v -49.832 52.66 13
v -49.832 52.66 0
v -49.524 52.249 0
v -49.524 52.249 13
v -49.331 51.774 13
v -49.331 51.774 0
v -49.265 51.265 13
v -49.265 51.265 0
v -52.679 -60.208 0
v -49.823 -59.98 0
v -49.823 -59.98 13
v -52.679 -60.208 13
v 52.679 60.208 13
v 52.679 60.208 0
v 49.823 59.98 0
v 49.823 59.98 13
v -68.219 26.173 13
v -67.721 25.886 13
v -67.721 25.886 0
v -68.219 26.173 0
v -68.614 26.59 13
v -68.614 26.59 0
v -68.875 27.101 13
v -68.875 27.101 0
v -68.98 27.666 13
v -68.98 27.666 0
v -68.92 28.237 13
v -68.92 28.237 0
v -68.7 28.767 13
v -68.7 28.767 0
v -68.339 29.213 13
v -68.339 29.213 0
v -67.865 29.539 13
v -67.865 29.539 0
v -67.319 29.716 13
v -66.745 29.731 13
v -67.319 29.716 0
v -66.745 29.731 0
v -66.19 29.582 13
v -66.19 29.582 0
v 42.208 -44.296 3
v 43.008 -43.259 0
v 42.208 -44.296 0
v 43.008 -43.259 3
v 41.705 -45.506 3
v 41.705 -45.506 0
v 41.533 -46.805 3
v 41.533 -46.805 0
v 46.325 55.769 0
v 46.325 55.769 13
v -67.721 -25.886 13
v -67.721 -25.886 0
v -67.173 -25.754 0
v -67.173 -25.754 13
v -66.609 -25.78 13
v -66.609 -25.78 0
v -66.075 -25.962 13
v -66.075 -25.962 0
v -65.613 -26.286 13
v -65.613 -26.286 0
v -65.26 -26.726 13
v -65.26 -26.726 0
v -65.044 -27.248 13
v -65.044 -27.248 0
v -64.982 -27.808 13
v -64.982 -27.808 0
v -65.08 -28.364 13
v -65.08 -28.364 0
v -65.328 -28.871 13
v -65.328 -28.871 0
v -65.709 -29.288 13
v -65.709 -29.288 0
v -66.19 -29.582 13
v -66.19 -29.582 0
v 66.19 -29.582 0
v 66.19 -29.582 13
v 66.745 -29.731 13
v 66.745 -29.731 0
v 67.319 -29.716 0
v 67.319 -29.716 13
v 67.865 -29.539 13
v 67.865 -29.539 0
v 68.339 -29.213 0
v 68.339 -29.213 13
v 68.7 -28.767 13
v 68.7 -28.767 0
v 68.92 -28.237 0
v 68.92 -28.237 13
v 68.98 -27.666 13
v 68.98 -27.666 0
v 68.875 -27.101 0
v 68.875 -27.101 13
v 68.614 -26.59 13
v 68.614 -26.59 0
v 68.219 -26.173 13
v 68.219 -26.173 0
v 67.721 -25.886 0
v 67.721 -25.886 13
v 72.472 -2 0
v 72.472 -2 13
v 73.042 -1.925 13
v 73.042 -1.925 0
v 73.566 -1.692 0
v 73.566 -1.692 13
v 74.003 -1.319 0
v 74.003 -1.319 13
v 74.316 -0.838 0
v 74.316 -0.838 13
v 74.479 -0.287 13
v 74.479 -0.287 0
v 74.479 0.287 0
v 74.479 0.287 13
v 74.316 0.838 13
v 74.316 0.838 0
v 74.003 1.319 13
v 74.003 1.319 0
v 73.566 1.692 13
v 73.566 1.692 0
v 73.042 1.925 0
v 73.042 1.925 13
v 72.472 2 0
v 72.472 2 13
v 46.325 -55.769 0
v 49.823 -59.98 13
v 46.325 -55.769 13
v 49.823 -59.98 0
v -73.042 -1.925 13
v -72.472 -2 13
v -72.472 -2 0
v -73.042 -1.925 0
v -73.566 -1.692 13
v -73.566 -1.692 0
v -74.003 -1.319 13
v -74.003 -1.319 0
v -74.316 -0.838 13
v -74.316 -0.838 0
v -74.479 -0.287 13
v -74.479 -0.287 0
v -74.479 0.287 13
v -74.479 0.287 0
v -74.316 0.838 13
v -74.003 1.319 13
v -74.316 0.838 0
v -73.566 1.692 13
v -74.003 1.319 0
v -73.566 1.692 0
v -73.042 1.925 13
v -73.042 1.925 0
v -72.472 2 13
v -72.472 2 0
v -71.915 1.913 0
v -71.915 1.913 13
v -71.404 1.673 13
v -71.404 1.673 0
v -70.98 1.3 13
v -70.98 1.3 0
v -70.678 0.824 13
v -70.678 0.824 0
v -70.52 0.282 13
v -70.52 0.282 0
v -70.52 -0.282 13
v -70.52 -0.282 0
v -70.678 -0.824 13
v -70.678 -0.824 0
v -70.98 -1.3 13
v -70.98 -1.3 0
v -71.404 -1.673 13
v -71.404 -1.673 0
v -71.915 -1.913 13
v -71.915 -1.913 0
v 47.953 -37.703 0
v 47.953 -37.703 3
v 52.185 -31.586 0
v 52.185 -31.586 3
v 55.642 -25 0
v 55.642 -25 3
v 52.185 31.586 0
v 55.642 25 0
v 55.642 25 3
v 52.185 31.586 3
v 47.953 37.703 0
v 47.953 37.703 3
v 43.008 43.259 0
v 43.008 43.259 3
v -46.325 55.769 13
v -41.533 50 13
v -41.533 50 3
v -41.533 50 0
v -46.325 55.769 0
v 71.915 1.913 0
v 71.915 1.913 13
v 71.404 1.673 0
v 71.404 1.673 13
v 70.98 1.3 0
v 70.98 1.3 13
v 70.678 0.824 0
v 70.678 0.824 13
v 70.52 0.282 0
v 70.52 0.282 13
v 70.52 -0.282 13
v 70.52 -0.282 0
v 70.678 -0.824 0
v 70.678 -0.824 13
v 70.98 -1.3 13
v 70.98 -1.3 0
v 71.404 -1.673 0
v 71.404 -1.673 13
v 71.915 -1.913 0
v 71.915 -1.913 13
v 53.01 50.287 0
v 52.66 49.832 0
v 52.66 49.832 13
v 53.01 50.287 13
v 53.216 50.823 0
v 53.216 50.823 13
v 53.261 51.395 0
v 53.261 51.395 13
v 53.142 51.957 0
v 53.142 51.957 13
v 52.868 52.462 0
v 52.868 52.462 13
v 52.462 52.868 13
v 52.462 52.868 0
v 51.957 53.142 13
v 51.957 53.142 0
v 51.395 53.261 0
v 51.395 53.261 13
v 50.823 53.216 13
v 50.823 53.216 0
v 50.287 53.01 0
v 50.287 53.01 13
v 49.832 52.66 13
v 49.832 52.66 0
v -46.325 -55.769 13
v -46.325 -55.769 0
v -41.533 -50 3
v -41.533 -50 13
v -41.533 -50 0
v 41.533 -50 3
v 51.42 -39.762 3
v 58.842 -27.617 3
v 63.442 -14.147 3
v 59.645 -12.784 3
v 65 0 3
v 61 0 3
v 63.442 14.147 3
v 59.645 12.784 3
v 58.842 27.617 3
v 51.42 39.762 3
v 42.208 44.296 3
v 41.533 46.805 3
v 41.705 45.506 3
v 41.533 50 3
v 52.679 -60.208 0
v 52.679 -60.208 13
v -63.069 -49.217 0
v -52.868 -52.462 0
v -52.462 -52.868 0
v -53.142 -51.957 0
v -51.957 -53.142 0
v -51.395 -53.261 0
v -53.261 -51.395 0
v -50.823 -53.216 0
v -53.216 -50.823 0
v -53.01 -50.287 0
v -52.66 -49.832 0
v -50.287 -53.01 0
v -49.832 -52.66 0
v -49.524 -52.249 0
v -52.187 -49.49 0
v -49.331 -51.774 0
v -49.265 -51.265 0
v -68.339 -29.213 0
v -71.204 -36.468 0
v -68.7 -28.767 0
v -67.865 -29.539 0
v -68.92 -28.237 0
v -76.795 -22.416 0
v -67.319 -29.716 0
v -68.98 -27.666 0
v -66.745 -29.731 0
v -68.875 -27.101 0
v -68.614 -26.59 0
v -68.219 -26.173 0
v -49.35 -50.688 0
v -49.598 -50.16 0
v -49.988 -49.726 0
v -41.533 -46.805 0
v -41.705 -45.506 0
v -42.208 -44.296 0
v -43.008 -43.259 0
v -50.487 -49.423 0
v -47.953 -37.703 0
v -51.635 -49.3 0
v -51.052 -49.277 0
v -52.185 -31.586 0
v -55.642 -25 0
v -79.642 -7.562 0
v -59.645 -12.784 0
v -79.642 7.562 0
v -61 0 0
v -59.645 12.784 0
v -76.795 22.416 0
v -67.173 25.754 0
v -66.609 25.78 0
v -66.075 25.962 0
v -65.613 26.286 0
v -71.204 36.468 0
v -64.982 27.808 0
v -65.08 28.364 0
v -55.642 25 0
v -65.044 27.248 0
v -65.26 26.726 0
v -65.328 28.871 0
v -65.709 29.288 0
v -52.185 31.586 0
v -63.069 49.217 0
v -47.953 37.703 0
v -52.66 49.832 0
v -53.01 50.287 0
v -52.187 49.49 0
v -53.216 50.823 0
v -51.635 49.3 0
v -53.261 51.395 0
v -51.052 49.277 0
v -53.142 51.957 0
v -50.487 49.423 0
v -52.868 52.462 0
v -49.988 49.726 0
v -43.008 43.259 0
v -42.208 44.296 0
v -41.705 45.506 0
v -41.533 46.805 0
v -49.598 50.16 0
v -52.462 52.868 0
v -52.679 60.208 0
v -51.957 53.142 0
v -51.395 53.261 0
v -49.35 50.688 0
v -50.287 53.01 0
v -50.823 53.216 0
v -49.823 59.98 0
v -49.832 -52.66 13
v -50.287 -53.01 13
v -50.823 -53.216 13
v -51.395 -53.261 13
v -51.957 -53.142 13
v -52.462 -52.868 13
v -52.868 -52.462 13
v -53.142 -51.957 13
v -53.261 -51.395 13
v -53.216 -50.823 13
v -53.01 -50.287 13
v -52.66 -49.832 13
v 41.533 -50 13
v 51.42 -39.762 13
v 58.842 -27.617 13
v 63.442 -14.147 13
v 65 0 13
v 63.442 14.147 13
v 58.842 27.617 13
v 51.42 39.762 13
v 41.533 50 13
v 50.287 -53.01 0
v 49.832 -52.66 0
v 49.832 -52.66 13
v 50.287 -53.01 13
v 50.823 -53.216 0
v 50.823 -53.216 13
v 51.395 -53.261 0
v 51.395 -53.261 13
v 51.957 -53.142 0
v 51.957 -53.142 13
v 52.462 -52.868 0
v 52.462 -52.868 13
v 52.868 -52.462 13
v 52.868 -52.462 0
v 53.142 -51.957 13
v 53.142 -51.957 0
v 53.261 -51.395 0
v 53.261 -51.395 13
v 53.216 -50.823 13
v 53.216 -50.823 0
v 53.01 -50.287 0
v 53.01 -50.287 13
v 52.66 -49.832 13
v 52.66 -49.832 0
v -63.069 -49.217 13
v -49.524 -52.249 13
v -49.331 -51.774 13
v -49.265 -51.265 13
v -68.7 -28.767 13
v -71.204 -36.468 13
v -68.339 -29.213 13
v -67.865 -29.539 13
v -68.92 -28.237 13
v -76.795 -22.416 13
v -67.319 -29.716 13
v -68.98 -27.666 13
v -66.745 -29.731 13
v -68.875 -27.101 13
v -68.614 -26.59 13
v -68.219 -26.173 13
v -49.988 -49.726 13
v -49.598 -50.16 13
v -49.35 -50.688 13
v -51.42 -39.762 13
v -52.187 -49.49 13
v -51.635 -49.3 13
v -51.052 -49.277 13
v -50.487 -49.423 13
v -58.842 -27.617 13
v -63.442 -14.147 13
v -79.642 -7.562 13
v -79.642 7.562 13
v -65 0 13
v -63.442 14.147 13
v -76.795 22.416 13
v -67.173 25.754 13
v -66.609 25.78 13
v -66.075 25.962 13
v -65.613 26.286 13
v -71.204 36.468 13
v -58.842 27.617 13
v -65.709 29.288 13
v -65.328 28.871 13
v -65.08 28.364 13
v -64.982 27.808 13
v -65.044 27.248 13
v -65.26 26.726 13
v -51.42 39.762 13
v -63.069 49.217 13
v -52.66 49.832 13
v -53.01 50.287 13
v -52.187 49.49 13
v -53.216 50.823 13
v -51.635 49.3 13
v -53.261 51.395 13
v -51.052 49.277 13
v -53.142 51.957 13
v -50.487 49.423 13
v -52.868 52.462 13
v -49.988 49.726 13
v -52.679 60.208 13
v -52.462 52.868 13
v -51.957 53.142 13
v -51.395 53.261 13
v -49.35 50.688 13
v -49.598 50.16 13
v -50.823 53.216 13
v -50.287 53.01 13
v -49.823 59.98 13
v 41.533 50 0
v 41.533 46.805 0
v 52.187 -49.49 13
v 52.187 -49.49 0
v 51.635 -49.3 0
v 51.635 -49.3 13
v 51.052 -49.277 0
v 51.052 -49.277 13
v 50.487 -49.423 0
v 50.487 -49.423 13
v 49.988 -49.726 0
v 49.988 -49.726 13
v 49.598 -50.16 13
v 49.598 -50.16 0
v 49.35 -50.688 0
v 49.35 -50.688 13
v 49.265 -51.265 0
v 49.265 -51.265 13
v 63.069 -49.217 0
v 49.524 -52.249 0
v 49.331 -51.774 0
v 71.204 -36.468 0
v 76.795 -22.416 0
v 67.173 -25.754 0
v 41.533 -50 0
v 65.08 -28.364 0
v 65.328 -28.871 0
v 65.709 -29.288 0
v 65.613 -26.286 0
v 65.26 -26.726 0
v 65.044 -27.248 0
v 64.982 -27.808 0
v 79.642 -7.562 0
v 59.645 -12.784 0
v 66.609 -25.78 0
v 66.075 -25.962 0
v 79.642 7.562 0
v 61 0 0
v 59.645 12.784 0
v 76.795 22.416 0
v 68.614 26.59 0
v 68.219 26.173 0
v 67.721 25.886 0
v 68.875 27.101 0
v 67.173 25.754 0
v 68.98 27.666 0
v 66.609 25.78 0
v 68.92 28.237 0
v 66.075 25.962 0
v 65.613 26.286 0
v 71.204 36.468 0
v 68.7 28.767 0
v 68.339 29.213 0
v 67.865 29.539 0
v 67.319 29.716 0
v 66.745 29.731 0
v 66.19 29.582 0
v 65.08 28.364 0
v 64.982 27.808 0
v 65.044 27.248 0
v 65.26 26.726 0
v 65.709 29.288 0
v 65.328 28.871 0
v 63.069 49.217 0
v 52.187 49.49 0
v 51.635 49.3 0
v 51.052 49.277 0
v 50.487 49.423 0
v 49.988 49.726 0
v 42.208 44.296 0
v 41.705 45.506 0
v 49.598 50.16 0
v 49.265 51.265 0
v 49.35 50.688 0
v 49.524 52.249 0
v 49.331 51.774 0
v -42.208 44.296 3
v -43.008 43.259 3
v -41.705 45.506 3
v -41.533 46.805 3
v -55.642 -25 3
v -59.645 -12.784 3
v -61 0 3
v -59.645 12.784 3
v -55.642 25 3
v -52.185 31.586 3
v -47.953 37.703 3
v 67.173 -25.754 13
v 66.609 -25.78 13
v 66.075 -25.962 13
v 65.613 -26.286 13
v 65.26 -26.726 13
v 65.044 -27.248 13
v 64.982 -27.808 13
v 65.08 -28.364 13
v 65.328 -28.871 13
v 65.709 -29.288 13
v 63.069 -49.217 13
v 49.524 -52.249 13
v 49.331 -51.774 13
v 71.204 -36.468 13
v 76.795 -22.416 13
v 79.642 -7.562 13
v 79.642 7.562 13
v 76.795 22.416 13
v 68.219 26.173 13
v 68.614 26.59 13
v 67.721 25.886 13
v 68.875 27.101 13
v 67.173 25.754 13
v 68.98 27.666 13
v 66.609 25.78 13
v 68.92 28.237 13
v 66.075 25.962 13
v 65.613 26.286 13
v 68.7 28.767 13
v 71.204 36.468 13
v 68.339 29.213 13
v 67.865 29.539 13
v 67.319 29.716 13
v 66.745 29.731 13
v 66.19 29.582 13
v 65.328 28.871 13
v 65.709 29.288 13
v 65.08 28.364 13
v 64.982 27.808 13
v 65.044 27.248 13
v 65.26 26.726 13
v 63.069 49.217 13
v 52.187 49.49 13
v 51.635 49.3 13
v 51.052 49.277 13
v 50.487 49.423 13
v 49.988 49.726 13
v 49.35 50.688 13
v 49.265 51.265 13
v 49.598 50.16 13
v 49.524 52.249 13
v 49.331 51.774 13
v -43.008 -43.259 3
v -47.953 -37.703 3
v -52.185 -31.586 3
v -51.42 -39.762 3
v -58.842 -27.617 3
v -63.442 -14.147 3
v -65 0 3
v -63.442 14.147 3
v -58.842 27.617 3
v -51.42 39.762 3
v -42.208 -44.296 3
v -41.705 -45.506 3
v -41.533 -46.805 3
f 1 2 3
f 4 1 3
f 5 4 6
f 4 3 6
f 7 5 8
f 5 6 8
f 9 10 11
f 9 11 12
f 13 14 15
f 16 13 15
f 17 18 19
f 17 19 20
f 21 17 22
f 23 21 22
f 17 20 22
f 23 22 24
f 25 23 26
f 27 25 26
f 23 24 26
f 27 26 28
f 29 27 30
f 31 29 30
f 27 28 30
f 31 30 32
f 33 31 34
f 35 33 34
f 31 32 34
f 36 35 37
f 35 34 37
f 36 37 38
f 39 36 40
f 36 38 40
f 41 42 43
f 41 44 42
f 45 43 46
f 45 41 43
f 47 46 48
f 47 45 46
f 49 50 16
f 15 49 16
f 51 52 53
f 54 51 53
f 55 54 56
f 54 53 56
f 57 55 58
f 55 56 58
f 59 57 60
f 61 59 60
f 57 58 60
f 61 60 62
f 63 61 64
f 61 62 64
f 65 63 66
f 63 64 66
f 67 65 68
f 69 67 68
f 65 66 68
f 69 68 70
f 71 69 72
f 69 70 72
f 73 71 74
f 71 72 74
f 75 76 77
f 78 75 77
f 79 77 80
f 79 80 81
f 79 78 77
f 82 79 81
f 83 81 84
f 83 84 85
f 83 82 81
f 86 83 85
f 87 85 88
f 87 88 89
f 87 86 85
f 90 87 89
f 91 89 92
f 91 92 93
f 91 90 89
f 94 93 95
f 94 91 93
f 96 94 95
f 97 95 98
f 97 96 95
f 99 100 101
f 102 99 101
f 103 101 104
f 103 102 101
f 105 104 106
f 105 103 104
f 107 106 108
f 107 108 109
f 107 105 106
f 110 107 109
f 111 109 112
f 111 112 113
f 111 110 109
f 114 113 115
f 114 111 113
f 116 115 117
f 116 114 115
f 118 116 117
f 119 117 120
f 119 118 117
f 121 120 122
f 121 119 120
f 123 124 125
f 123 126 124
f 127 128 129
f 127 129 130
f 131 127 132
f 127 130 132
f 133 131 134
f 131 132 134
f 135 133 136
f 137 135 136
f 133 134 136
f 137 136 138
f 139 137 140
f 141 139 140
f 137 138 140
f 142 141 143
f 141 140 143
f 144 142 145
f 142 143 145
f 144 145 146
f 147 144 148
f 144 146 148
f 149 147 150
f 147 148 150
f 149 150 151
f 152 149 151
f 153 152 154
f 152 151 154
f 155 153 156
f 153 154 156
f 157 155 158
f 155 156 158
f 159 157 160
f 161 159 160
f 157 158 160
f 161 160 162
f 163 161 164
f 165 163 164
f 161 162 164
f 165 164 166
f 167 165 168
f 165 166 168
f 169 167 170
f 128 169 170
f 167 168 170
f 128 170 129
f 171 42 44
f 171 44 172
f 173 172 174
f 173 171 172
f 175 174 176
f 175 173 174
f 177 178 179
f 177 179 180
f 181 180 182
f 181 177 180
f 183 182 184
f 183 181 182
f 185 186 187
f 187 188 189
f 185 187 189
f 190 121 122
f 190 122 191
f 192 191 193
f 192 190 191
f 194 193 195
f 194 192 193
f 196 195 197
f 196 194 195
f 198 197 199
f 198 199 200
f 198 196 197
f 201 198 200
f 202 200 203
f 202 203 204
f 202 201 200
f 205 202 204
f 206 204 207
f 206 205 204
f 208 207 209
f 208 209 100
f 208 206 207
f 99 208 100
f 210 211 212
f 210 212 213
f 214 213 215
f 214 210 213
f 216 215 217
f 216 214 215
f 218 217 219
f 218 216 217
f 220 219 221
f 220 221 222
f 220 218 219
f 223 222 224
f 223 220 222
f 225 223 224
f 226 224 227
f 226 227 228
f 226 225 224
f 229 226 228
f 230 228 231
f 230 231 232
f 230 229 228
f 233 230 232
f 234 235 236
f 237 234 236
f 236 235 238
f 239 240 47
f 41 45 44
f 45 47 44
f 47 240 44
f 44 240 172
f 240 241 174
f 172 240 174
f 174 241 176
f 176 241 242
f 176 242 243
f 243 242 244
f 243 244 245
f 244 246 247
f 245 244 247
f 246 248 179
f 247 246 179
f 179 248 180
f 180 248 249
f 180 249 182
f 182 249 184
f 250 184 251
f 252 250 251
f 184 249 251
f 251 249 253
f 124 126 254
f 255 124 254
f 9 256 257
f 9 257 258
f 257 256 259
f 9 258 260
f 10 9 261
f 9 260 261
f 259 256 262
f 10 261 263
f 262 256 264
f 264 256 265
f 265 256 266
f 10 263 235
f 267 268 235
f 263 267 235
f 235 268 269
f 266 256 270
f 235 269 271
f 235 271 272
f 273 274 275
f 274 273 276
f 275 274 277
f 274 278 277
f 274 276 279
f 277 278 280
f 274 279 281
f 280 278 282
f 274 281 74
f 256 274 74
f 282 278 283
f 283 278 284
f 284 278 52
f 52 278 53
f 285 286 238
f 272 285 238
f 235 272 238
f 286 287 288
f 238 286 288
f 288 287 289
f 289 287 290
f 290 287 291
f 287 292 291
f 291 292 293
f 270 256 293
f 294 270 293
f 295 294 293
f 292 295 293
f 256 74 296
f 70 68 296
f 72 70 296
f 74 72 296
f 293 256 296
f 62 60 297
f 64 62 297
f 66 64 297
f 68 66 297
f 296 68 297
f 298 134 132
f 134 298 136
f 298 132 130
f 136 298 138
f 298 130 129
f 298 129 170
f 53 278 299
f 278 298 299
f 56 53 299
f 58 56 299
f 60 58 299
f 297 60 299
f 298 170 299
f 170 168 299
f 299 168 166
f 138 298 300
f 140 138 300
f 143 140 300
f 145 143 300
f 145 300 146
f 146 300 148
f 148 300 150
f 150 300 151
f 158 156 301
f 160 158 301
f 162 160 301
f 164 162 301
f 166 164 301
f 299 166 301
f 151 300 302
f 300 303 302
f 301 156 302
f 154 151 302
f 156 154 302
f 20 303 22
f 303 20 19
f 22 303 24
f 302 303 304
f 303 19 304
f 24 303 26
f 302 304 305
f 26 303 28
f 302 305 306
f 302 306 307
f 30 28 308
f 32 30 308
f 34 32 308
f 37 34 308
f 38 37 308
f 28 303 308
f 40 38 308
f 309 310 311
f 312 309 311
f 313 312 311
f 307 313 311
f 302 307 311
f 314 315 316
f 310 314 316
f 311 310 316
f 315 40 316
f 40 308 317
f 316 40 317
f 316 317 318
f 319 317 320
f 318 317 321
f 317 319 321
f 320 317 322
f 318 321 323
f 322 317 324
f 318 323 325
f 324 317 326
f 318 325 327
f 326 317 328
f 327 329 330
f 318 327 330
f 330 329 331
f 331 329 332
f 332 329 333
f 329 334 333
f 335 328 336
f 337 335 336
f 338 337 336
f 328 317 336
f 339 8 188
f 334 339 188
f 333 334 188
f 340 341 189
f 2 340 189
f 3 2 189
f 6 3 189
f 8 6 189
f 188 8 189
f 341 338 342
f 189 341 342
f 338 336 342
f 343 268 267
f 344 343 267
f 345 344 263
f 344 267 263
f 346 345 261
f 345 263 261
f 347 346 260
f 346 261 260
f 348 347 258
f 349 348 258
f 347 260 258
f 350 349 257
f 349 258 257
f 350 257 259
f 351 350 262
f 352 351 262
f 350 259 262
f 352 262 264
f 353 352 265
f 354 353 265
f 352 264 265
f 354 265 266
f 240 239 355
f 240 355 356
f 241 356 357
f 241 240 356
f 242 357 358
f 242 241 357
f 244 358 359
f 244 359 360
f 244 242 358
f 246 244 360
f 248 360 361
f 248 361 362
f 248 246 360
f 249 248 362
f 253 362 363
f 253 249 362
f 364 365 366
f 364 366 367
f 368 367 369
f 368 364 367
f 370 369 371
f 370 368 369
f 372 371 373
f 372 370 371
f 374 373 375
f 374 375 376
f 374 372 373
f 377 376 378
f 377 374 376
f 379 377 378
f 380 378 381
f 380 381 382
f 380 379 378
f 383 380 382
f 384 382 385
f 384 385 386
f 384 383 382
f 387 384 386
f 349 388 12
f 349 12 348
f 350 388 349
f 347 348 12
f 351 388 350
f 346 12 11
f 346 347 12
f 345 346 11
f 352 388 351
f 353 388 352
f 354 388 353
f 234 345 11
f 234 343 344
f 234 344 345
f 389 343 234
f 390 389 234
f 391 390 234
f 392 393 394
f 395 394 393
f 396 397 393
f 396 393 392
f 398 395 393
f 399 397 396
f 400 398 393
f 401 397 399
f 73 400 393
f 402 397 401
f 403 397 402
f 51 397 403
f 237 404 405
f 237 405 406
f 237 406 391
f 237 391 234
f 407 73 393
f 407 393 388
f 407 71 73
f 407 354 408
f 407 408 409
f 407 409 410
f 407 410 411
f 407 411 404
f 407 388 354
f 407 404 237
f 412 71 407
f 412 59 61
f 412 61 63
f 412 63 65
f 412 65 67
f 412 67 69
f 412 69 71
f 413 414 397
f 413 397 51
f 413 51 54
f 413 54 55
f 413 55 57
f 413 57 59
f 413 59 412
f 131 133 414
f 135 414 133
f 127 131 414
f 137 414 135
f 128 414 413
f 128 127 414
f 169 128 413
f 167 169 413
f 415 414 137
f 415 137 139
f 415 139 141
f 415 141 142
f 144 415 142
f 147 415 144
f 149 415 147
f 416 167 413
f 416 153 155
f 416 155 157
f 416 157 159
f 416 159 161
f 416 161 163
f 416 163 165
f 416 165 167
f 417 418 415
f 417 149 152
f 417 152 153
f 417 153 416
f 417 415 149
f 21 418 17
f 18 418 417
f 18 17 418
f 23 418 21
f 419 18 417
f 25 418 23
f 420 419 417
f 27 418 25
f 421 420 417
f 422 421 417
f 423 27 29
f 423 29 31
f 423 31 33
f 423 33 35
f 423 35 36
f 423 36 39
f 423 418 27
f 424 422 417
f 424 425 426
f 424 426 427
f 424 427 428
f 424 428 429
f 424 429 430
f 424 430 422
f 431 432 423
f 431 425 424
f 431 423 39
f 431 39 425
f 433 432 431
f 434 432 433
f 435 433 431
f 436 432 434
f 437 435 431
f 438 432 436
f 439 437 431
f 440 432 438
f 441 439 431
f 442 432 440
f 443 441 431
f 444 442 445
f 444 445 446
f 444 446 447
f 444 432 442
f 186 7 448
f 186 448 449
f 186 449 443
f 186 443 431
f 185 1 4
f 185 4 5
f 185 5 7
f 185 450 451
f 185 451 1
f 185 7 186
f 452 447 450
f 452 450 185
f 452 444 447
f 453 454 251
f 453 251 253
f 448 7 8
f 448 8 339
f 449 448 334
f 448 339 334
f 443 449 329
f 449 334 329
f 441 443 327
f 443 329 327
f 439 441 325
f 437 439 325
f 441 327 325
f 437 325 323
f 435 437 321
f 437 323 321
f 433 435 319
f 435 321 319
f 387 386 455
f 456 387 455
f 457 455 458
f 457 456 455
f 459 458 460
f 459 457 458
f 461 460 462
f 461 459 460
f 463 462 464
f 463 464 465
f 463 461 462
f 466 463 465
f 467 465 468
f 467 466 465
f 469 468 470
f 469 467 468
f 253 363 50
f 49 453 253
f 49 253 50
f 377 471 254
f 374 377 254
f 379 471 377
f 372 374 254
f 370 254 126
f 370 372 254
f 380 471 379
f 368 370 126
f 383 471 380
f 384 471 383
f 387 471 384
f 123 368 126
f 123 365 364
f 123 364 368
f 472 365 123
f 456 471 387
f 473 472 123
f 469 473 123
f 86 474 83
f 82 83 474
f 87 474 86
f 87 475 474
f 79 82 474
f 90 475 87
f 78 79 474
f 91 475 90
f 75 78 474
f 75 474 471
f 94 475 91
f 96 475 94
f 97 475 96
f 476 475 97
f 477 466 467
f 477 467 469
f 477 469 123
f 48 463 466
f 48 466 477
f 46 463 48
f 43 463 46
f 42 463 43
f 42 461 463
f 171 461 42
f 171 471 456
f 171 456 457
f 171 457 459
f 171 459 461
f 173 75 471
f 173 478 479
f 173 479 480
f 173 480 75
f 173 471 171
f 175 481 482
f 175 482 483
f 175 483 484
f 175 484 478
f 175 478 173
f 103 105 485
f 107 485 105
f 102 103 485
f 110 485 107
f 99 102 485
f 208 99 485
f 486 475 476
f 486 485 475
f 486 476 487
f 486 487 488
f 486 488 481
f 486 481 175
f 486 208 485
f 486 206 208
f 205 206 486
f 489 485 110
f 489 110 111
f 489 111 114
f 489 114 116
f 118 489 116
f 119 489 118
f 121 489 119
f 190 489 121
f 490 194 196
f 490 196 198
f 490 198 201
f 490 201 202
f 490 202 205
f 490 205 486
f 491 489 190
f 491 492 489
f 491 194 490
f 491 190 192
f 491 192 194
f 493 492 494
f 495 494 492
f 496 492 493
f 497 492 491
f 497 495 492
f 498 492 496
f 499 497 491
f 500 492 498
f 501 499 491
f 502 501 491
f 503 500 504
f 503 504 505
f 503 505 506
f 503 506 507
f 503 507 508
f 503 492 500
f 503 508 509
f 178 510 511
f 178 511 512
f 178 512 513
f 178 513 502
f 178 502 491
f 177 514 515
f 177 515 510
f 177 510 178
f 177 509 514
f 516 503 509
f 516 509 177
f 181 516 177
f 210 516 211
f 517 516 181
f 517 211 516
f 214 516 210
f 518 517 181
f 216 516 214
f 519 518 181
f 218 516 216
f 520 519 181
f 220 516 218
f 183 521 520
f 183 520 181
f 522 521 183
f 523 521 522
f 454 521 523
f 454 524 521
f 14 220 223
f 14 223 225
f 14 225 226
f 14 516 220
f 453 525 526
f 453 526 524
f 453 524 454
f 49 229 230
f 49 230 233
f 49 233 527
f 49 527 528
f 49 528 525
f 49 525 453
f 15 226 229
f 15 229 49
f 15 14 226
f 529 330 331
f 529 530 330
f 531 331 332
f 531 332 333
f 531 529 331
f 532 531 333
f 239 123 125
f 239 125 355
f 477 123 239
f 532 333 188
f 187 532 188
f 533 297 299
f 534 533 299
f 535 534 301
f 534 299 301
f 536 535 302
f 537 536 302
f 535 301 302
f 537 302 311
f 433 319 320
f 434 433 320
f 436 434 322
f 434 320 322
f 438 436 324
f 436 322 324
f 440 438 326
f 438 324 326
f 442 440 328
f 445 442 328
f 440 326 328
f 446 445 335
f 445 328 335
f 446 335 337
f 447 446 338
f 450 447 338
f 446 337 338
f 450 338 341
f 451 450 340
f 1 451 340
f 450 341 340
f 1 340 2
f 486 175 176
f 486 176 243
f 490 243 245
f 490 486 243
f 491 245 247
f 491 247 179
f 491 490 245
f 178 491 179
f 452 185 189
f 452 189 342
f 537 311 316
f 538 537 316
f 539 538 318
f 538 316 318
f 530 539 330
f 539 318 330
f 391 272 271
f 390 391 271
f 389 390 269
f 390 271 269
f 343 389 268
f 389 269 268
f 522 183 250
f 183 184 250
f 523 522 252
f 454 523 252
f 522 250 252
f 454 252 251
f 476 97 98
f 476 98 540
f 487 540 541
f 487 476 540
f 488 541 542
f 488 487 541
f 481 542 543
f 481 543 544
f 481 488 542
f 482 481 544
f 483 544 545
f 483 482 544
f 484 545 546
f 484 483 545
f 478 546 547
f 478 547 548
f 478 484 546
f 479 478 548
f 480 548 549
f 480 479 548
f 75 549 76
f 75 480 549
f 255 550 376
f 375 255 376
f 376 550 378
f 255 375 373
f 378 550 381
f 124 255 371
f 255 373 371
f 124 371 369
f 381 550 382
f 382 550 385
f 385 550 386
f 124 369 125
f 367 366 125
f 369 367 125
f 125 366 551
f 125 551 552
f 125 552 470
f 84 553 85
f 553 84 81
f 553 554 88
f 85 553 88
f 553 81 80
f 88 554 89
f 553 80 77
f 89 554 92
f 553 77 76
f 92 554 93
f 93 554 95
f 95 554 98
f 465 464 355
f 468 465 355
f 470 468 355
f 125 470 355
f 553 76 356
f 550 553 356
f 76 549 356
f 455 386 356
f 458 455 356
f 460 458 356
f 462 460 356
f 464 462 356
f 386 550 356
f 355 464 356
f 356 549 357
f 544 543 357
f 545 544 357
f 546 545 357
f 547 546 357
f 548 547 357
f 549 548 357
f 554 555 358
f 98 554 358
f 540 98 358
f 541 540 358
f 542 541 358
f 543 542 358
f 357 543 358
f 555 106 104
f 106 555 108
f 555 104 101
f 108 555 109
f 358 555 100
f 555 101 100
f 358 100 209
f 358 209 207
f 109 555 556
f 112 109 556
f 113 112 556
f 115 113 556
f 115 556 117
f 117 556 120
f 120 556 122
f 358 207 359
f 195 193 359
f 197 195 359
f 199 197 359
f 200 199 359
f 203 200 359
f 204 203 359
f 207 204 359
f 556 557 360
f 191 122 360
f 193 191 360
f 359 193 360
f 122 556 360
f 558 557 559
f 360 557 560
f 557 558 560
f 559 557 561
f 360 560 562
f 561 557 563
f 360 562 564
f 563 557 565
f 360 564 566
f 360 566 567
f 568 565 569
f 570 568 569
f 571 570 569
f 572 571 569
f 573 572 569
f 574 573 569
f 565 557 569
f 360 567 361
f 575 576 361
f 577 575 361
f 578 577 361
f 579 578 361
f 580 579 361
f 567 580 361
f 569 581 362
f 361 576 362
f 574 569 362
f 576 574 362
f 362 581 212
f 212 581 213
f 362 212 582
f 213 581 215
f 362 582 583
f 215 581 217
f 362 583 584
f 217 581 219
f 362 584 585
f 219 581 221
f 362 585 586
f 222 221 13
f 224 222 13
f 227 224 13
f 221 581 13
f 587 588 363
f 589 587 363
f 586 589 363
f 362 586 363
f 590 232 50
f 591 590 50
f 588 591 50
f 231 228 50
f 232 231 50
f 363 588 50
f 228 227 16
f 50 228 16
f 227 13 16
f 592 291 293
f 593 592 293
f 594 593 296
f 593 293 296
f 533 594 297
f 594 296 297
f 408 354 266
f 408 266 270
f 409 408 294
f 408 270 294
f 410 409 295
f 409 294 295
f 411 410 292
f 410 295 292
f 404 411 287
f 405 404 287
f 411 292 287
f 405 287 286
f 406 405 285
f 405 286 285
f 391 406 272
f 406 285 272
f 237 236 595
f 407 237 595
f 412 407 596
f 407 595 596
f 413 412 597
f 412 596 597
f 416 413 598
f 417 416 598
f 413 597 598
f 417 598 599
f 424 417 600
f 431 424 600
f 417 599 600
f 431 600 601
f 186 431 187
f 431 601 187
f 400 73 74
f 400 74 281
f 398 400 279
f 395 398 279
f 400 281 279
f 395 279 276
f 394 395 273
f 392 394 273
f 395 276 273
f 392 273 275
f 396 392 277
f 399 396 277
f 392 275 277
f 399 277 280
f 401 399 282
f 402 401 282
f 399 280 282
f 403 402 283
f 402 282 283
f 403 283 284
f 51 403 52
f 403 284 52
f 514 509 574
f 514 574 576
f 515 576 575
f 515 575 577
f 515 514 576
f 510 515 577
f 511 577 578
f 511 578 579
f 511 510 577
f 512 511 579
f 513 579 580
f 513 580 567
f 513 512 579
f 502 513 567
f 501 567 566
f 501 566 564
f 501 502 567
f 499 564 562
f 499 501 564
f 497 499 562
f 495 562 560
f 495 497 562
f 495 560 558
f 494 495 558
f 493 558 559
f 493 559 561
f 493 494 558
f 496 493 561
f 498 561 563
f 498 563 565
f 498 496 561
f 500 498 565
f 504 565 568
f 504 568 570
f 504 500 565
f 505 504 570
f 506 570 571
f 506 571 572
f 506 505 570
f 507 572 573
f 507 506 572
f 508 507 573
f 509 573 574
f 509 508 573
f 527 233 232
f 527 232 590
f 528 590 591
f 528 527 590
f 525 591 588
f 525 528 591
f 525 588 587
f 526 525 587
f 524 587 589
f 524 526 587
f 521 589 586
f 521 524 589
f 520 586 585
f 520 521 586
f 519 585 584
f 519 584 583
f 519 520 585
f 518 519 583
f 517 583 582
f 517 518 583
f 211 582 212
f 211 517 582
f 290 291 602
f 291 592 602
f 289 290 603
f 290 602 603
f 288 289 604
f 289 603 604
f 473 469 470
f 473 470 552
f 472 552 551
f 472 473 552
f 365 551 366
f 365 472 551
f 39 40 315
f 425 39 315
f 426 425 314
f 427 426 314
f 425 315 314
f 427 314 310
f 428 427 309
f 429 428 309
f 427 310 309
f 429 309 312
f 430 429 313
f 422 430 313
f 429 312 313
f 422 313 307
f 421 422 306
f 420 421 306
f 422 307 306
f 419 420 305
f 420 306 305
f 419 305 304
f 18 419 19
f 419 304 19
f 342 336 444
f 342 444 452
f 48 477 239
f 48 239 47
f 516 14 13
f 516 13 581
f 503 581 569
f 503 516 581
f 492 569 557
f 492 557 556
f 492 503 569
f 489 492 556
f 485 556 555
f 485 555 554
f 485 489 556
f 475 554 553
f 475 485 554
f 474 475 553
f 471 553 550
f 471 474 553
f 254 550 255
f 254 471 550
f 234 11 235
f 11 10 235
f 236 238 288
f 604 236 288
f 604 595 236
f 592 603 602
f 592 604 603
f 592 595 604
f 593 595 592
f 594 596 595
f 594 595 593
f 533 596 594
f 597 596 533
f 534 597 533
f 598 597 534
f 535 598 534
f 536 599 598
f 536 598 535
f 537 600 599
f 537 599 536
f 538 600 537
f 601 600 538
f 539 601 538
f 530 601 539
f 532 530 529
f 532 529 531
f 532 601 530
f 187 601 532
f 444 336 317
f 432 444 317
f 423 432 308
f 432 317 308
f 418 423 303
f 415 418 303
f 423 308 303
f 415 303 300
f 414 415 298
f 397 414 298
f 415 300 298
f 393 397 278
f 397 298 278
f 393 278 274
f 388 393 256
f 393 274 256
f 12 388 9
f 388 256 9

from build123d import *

# Parameters (mm, degrees)
F1_DEPTH    = 3
F2_DEPTH    = 13
F3_R        = 5
F4_T1_DEPTH = 23.5438904605


# Not quite as in the source:
# - a fillet or chamfer that OpenCascade refuses, or shapes differently, is made with other operations: its cross-section is extruded or revolved along the edge and cut away or added


with BuildPart() as f1:
    # F0 (on Top) → F1 (new body)
    with BuildSketch(Plane.XY):
        with BuildLine():
            ThreePointArc((-55.641710973, -25), (-61, 0), (-55.641710973, 25))
            ThreePointArc((-55.641710973, 25), (-49.5734728737, 35.5453342541), (-41.5331193146, 44.6766158074))
            Line((-41.5331193146, 44.6766158074), (-41.5331193146, 50))
            ThreePointArc((-41.5331193146, 50), (-65, 0), (-41.5331193146, -50))
            Line((-41.5331193146, -50), (-41.5331193146, -44.6766158074))
            ThreePointArc((-41.5331193146, -44.6766158074), (-49.5734728737, -35.5453342541), (-55.641710973, -25))
        make_face()
    extrude(amount=F1_DEPTH)



with BuildPart() as f1b:
    # F0 (on Top) → F1, piece 2 (new body)
    with BuildSketch(Plane.XY):
        with BuildLine():
            ThreePointArc((-49.8316562129, 52.6598142712), (-48.1036598795, 54.2428604168), (-46.3254023124, 55.7692307692))
            Line((-46.3254023124, 55.7692307692), (-51.1176853103, 61.5384615385))
            ThreePointArc((-51.1176853103, 61.5384615385), (-80, 0), (-51.1176853103, -61.5384615385))
            Line((-51.1176853103, -61.5384615385), (-46.3254023124, -55.7692307692))
            ThreePointArc((-46.3254023124, -55.7692307692), (-48.1036598795, -54.2428604168), (-49.8316562129, -52.6598142712))
            ThreePointArc((-49.8316562129, -52.6598142712), (-52.6794551984, -52.6794551984), (-52.6598142712, -49.8316562129))
            ThreePointArc((-52.6598142712, -49.8316562129), (-60.2815468919, -40.2788418939), (-66.1904857193, -29.581575351))
            ThreePointArc((-66.1904857193, -29.581575351), (-68.8290251721, -28.5099157112), (-67.721073831, -25.8864087733))
            ThreePointArc((-67.721073831, -25.8864087733), (-71.1069328292, -14.1440483462), (-72.4724137931, -1.9998097412))
            ThreePointArc((-72.4724137931, -1.9998097412), (-74.5, 0), (-72.4724137931, 1.9998097412))
            ThreePointArc((-72.4724137931, 1.9998097412), (-71.1069328292, 14.1440483462), (-67.721073831, 25.8864087733))
            ThreePointArc((-67.721073831, 25.8864087733), (-68.8290251721, 28.5099157112), (-66.1904857193, 29.581575351))
            ThreePointArc((-66.1904857193, 29.581575351), (-60.2815468919, 40.2788418939), (-52.6598142712, 49.8316562129))
            ThreePointArc((-52.6598142712, 49.8316562129), (-52.6794551984, 52.6794551984), (-49.8316562129, 52.6598142712))
        make_face()
    extrude(amount=F1_DEPTH)


with BuildPart() as f1_1:
    add(f1.part)

    add(f1b.part)  # F2 merges F1b
    # F0 (on Top) → F2 (join)
    with BuildSketch(Plane.XY):
        with BuildLine():
            ThreePointArc((-41.5331193146, -50), (-65, 0), (-41.5331193146, 50))
            Line((-41.5331193146, 50), (-46.3254023124, 55.7692307692))
            ThreePointArc((-46.3254023124, 55.7692307692), (-48.1036598795, 54.2428604168), (-49.8316562129, 52.6598142712))
            ThreePointArc((-49.8316562129, 52.6598142712), (-49.4122479979, 52.0178468293), (-49.265241636, 51.265241636))
            ThreePointArc((-49.265241636, 51.265241636), (-50.4871495047, 49.4228050333), (-52.6598142712, 49.8316562129))
            ThreePointArc((-52.6598142712, 49.8316562129), (-60.2815468919, 40.2788418939), (-66.1904857193, 29.581575351))
            ThreePointArc((-66.1904857193, 29.581575351), (-65.3107032116, 28.8441940675), (-64.9812661071, 27.7445488465))
            ThreePointArc((-64.9812661071, 27.7445488465), (-65.8586832477, 26.0893123909), (-67.721073831, 25.8864087733))
            ThreePointArc((-67.721073831, 25.8864087733), (-71.1069328292, 14.1440483462), (-72.4724137931, 1.9998097412))
            ThreePointArc((-72.4724137931, 1.9998097412), (-71.0760666424, 1.4044264997), (-70.5, 0))
            ThreePointArc((-70.5, 0), (-71.0760666424, -1.4044264997), (-72.4724137931, -1.9998097412))
            ThreePointArc((-72.4724137931, -1.9998097412), (-71.1069328292, -14.1440483462), (-67.721073831, -25.8864087733))
            ThreePointArc((-67.721073831, -25.8864087733), (-65.8586832477, -26.0893123909), (-64.9812661071, -27.7445488465))
            ThreePointArc((-64.9812661071, -27.7445488465), (-65.3107032116, -28.8441940675), (-66.1904857193, -29.581575351))
            ThreePointArc((-66.1904857193, -29.581575351), (-60.2815468919, -40.2788418939), (-52.6598142712, -49.8316562129))
            ThreePointArc((-52.6598142712, -49.8316562129), (-50.4871495047, -49.4228050333), (-49.265241636, -51.265241636))
            ThreePointArc((-49.265241636, -51.265241636), (-49.4122479979, -52.0178468293), (-49.8316562129, -52.6598142712))
            ThreePointArc((-49.8316562129, -52.6598142712), (-48.1036598795, -54.2428604168), (-46.3254023124, -55.7692307692))
            Line((-46.3254023124, -55.7692307692), (-41.5331193146, -50))
        make_face()
        with BuildLine():
            ThreePointArc((-49.8316562129, 52.6598142712), (-48.1036598795, 54.2428604168), (-46.3254023124, 55.7692307692))
            Line((-46.3254023124, 55.7692307692), (-51.1176853103, 61.5384615385))
            ThreePointArc((-51.1176853103, 61.5384615385), (-80, 0), (-51.1176853103, -61.5384615385))
            Line((-51.1176853103, -61.5384615385), (-46.3254023124, -55.7692307692))
            ThreePointArc((-46.3254023124, -55.7692307692), (-48.1036598795, -54.2428604168), (-49.8316562129, -52.6598142712))
            ThreePointArc((-49.8316562129, -52.6598142712), (-52.6794551984, -52.6794551984), (-52.6598142712, -49.8316562129))
            ThreePointArc((-52.6598142712, -49.8316562129), (-60.2815468919, -40.2788418939), (-66.1904857193, -29.581575351))
            ThreePointArc((-66.1904857193, -29.581575351), (-68.8290251721, -28.5099157112), (-67.721073831, -25.8864087733))
            ThreePointArc((-67.721073831, -25.8864087733), (-71.1069328292, -14.1440483462), (-72.4724137931, -1.9998097412))
            ThreePointArc((-72.4724137931, -1.9998097412), (-74.5, 0), (-72.4724137931, 1.9998097412))
            ThreePointArc((-72.4724137931, 1.9998097412), (-71.1069328292, 14.1440483462), (-67.721073831, 25.8864087733))
            ThreePointArc((-67.721073831, 25.8864087733), (-68.8290251721, 28.5099157112), (-66.1904857193, 29.581575351))
            ThreePointArc((-66.1904857193, 29.581575351), (-60.2815468919, 40.2788418939), (-52.6598142712, 49.8316562129))
            ThreePointArc((-52.6598142712, 49.8316562129), (-52.6794551984, 52.6794551984), (-49.8316562129, 52.6598142712))
        make_face()
    extrude(amount=F2_DEPTH)

    # F3
    f3_edges = [f1_1.edges().sort_by_distance(p)[0] for p in [
        (-41.533119, 44.676616, 1.5),
        (-41.533119, -44.676616, 1.5),
    ]]
    fillet(f3_edges, radius=F3_R)

    # F4: chamfer of 2 on 2 edges, made by hand

    # F4_s2 → F4_t1 (cut)
    with BuildSketch(Plane.XY.offset(-5.2719452303)):
        with BuildLine():
            Line((-52.6787878448, 60.2075187265), (-49.8233566102, 59.9802728911))
            Line((-49.8233566102, 59.9802728911), (-51.1176853103, 61.5384615385))
            ThreePointArc((-51.1176853103, 61.5384615385), (-51.9240174848, 60.8596451538), (-52.6787878448, 60.2075187265))
        make_face()
        with BuildLine():
            Line((-49.8233566102, -59.9802728911), (-52.6787878448, -60.2075187265))
            ThreePointArc((-52.6787878448, -60.2075187265), (-51.9240174848, -60.8596451538), (-51.1176853103, -61.5384615385))
            Line((-51.1176853103, -61.5384615385), (-49.8233566102, -59.9802728911))
        make_face()
    extrude(amount=F4_T1_DEPTH, mode=Mode.SUBTRACT)


with BuildPart() as f5_1:
    # F5: instance of F1
    add(f1_1.part.mirror(Plane.YZ))


solid = Compound([f1_1.part, f5_1.part])
